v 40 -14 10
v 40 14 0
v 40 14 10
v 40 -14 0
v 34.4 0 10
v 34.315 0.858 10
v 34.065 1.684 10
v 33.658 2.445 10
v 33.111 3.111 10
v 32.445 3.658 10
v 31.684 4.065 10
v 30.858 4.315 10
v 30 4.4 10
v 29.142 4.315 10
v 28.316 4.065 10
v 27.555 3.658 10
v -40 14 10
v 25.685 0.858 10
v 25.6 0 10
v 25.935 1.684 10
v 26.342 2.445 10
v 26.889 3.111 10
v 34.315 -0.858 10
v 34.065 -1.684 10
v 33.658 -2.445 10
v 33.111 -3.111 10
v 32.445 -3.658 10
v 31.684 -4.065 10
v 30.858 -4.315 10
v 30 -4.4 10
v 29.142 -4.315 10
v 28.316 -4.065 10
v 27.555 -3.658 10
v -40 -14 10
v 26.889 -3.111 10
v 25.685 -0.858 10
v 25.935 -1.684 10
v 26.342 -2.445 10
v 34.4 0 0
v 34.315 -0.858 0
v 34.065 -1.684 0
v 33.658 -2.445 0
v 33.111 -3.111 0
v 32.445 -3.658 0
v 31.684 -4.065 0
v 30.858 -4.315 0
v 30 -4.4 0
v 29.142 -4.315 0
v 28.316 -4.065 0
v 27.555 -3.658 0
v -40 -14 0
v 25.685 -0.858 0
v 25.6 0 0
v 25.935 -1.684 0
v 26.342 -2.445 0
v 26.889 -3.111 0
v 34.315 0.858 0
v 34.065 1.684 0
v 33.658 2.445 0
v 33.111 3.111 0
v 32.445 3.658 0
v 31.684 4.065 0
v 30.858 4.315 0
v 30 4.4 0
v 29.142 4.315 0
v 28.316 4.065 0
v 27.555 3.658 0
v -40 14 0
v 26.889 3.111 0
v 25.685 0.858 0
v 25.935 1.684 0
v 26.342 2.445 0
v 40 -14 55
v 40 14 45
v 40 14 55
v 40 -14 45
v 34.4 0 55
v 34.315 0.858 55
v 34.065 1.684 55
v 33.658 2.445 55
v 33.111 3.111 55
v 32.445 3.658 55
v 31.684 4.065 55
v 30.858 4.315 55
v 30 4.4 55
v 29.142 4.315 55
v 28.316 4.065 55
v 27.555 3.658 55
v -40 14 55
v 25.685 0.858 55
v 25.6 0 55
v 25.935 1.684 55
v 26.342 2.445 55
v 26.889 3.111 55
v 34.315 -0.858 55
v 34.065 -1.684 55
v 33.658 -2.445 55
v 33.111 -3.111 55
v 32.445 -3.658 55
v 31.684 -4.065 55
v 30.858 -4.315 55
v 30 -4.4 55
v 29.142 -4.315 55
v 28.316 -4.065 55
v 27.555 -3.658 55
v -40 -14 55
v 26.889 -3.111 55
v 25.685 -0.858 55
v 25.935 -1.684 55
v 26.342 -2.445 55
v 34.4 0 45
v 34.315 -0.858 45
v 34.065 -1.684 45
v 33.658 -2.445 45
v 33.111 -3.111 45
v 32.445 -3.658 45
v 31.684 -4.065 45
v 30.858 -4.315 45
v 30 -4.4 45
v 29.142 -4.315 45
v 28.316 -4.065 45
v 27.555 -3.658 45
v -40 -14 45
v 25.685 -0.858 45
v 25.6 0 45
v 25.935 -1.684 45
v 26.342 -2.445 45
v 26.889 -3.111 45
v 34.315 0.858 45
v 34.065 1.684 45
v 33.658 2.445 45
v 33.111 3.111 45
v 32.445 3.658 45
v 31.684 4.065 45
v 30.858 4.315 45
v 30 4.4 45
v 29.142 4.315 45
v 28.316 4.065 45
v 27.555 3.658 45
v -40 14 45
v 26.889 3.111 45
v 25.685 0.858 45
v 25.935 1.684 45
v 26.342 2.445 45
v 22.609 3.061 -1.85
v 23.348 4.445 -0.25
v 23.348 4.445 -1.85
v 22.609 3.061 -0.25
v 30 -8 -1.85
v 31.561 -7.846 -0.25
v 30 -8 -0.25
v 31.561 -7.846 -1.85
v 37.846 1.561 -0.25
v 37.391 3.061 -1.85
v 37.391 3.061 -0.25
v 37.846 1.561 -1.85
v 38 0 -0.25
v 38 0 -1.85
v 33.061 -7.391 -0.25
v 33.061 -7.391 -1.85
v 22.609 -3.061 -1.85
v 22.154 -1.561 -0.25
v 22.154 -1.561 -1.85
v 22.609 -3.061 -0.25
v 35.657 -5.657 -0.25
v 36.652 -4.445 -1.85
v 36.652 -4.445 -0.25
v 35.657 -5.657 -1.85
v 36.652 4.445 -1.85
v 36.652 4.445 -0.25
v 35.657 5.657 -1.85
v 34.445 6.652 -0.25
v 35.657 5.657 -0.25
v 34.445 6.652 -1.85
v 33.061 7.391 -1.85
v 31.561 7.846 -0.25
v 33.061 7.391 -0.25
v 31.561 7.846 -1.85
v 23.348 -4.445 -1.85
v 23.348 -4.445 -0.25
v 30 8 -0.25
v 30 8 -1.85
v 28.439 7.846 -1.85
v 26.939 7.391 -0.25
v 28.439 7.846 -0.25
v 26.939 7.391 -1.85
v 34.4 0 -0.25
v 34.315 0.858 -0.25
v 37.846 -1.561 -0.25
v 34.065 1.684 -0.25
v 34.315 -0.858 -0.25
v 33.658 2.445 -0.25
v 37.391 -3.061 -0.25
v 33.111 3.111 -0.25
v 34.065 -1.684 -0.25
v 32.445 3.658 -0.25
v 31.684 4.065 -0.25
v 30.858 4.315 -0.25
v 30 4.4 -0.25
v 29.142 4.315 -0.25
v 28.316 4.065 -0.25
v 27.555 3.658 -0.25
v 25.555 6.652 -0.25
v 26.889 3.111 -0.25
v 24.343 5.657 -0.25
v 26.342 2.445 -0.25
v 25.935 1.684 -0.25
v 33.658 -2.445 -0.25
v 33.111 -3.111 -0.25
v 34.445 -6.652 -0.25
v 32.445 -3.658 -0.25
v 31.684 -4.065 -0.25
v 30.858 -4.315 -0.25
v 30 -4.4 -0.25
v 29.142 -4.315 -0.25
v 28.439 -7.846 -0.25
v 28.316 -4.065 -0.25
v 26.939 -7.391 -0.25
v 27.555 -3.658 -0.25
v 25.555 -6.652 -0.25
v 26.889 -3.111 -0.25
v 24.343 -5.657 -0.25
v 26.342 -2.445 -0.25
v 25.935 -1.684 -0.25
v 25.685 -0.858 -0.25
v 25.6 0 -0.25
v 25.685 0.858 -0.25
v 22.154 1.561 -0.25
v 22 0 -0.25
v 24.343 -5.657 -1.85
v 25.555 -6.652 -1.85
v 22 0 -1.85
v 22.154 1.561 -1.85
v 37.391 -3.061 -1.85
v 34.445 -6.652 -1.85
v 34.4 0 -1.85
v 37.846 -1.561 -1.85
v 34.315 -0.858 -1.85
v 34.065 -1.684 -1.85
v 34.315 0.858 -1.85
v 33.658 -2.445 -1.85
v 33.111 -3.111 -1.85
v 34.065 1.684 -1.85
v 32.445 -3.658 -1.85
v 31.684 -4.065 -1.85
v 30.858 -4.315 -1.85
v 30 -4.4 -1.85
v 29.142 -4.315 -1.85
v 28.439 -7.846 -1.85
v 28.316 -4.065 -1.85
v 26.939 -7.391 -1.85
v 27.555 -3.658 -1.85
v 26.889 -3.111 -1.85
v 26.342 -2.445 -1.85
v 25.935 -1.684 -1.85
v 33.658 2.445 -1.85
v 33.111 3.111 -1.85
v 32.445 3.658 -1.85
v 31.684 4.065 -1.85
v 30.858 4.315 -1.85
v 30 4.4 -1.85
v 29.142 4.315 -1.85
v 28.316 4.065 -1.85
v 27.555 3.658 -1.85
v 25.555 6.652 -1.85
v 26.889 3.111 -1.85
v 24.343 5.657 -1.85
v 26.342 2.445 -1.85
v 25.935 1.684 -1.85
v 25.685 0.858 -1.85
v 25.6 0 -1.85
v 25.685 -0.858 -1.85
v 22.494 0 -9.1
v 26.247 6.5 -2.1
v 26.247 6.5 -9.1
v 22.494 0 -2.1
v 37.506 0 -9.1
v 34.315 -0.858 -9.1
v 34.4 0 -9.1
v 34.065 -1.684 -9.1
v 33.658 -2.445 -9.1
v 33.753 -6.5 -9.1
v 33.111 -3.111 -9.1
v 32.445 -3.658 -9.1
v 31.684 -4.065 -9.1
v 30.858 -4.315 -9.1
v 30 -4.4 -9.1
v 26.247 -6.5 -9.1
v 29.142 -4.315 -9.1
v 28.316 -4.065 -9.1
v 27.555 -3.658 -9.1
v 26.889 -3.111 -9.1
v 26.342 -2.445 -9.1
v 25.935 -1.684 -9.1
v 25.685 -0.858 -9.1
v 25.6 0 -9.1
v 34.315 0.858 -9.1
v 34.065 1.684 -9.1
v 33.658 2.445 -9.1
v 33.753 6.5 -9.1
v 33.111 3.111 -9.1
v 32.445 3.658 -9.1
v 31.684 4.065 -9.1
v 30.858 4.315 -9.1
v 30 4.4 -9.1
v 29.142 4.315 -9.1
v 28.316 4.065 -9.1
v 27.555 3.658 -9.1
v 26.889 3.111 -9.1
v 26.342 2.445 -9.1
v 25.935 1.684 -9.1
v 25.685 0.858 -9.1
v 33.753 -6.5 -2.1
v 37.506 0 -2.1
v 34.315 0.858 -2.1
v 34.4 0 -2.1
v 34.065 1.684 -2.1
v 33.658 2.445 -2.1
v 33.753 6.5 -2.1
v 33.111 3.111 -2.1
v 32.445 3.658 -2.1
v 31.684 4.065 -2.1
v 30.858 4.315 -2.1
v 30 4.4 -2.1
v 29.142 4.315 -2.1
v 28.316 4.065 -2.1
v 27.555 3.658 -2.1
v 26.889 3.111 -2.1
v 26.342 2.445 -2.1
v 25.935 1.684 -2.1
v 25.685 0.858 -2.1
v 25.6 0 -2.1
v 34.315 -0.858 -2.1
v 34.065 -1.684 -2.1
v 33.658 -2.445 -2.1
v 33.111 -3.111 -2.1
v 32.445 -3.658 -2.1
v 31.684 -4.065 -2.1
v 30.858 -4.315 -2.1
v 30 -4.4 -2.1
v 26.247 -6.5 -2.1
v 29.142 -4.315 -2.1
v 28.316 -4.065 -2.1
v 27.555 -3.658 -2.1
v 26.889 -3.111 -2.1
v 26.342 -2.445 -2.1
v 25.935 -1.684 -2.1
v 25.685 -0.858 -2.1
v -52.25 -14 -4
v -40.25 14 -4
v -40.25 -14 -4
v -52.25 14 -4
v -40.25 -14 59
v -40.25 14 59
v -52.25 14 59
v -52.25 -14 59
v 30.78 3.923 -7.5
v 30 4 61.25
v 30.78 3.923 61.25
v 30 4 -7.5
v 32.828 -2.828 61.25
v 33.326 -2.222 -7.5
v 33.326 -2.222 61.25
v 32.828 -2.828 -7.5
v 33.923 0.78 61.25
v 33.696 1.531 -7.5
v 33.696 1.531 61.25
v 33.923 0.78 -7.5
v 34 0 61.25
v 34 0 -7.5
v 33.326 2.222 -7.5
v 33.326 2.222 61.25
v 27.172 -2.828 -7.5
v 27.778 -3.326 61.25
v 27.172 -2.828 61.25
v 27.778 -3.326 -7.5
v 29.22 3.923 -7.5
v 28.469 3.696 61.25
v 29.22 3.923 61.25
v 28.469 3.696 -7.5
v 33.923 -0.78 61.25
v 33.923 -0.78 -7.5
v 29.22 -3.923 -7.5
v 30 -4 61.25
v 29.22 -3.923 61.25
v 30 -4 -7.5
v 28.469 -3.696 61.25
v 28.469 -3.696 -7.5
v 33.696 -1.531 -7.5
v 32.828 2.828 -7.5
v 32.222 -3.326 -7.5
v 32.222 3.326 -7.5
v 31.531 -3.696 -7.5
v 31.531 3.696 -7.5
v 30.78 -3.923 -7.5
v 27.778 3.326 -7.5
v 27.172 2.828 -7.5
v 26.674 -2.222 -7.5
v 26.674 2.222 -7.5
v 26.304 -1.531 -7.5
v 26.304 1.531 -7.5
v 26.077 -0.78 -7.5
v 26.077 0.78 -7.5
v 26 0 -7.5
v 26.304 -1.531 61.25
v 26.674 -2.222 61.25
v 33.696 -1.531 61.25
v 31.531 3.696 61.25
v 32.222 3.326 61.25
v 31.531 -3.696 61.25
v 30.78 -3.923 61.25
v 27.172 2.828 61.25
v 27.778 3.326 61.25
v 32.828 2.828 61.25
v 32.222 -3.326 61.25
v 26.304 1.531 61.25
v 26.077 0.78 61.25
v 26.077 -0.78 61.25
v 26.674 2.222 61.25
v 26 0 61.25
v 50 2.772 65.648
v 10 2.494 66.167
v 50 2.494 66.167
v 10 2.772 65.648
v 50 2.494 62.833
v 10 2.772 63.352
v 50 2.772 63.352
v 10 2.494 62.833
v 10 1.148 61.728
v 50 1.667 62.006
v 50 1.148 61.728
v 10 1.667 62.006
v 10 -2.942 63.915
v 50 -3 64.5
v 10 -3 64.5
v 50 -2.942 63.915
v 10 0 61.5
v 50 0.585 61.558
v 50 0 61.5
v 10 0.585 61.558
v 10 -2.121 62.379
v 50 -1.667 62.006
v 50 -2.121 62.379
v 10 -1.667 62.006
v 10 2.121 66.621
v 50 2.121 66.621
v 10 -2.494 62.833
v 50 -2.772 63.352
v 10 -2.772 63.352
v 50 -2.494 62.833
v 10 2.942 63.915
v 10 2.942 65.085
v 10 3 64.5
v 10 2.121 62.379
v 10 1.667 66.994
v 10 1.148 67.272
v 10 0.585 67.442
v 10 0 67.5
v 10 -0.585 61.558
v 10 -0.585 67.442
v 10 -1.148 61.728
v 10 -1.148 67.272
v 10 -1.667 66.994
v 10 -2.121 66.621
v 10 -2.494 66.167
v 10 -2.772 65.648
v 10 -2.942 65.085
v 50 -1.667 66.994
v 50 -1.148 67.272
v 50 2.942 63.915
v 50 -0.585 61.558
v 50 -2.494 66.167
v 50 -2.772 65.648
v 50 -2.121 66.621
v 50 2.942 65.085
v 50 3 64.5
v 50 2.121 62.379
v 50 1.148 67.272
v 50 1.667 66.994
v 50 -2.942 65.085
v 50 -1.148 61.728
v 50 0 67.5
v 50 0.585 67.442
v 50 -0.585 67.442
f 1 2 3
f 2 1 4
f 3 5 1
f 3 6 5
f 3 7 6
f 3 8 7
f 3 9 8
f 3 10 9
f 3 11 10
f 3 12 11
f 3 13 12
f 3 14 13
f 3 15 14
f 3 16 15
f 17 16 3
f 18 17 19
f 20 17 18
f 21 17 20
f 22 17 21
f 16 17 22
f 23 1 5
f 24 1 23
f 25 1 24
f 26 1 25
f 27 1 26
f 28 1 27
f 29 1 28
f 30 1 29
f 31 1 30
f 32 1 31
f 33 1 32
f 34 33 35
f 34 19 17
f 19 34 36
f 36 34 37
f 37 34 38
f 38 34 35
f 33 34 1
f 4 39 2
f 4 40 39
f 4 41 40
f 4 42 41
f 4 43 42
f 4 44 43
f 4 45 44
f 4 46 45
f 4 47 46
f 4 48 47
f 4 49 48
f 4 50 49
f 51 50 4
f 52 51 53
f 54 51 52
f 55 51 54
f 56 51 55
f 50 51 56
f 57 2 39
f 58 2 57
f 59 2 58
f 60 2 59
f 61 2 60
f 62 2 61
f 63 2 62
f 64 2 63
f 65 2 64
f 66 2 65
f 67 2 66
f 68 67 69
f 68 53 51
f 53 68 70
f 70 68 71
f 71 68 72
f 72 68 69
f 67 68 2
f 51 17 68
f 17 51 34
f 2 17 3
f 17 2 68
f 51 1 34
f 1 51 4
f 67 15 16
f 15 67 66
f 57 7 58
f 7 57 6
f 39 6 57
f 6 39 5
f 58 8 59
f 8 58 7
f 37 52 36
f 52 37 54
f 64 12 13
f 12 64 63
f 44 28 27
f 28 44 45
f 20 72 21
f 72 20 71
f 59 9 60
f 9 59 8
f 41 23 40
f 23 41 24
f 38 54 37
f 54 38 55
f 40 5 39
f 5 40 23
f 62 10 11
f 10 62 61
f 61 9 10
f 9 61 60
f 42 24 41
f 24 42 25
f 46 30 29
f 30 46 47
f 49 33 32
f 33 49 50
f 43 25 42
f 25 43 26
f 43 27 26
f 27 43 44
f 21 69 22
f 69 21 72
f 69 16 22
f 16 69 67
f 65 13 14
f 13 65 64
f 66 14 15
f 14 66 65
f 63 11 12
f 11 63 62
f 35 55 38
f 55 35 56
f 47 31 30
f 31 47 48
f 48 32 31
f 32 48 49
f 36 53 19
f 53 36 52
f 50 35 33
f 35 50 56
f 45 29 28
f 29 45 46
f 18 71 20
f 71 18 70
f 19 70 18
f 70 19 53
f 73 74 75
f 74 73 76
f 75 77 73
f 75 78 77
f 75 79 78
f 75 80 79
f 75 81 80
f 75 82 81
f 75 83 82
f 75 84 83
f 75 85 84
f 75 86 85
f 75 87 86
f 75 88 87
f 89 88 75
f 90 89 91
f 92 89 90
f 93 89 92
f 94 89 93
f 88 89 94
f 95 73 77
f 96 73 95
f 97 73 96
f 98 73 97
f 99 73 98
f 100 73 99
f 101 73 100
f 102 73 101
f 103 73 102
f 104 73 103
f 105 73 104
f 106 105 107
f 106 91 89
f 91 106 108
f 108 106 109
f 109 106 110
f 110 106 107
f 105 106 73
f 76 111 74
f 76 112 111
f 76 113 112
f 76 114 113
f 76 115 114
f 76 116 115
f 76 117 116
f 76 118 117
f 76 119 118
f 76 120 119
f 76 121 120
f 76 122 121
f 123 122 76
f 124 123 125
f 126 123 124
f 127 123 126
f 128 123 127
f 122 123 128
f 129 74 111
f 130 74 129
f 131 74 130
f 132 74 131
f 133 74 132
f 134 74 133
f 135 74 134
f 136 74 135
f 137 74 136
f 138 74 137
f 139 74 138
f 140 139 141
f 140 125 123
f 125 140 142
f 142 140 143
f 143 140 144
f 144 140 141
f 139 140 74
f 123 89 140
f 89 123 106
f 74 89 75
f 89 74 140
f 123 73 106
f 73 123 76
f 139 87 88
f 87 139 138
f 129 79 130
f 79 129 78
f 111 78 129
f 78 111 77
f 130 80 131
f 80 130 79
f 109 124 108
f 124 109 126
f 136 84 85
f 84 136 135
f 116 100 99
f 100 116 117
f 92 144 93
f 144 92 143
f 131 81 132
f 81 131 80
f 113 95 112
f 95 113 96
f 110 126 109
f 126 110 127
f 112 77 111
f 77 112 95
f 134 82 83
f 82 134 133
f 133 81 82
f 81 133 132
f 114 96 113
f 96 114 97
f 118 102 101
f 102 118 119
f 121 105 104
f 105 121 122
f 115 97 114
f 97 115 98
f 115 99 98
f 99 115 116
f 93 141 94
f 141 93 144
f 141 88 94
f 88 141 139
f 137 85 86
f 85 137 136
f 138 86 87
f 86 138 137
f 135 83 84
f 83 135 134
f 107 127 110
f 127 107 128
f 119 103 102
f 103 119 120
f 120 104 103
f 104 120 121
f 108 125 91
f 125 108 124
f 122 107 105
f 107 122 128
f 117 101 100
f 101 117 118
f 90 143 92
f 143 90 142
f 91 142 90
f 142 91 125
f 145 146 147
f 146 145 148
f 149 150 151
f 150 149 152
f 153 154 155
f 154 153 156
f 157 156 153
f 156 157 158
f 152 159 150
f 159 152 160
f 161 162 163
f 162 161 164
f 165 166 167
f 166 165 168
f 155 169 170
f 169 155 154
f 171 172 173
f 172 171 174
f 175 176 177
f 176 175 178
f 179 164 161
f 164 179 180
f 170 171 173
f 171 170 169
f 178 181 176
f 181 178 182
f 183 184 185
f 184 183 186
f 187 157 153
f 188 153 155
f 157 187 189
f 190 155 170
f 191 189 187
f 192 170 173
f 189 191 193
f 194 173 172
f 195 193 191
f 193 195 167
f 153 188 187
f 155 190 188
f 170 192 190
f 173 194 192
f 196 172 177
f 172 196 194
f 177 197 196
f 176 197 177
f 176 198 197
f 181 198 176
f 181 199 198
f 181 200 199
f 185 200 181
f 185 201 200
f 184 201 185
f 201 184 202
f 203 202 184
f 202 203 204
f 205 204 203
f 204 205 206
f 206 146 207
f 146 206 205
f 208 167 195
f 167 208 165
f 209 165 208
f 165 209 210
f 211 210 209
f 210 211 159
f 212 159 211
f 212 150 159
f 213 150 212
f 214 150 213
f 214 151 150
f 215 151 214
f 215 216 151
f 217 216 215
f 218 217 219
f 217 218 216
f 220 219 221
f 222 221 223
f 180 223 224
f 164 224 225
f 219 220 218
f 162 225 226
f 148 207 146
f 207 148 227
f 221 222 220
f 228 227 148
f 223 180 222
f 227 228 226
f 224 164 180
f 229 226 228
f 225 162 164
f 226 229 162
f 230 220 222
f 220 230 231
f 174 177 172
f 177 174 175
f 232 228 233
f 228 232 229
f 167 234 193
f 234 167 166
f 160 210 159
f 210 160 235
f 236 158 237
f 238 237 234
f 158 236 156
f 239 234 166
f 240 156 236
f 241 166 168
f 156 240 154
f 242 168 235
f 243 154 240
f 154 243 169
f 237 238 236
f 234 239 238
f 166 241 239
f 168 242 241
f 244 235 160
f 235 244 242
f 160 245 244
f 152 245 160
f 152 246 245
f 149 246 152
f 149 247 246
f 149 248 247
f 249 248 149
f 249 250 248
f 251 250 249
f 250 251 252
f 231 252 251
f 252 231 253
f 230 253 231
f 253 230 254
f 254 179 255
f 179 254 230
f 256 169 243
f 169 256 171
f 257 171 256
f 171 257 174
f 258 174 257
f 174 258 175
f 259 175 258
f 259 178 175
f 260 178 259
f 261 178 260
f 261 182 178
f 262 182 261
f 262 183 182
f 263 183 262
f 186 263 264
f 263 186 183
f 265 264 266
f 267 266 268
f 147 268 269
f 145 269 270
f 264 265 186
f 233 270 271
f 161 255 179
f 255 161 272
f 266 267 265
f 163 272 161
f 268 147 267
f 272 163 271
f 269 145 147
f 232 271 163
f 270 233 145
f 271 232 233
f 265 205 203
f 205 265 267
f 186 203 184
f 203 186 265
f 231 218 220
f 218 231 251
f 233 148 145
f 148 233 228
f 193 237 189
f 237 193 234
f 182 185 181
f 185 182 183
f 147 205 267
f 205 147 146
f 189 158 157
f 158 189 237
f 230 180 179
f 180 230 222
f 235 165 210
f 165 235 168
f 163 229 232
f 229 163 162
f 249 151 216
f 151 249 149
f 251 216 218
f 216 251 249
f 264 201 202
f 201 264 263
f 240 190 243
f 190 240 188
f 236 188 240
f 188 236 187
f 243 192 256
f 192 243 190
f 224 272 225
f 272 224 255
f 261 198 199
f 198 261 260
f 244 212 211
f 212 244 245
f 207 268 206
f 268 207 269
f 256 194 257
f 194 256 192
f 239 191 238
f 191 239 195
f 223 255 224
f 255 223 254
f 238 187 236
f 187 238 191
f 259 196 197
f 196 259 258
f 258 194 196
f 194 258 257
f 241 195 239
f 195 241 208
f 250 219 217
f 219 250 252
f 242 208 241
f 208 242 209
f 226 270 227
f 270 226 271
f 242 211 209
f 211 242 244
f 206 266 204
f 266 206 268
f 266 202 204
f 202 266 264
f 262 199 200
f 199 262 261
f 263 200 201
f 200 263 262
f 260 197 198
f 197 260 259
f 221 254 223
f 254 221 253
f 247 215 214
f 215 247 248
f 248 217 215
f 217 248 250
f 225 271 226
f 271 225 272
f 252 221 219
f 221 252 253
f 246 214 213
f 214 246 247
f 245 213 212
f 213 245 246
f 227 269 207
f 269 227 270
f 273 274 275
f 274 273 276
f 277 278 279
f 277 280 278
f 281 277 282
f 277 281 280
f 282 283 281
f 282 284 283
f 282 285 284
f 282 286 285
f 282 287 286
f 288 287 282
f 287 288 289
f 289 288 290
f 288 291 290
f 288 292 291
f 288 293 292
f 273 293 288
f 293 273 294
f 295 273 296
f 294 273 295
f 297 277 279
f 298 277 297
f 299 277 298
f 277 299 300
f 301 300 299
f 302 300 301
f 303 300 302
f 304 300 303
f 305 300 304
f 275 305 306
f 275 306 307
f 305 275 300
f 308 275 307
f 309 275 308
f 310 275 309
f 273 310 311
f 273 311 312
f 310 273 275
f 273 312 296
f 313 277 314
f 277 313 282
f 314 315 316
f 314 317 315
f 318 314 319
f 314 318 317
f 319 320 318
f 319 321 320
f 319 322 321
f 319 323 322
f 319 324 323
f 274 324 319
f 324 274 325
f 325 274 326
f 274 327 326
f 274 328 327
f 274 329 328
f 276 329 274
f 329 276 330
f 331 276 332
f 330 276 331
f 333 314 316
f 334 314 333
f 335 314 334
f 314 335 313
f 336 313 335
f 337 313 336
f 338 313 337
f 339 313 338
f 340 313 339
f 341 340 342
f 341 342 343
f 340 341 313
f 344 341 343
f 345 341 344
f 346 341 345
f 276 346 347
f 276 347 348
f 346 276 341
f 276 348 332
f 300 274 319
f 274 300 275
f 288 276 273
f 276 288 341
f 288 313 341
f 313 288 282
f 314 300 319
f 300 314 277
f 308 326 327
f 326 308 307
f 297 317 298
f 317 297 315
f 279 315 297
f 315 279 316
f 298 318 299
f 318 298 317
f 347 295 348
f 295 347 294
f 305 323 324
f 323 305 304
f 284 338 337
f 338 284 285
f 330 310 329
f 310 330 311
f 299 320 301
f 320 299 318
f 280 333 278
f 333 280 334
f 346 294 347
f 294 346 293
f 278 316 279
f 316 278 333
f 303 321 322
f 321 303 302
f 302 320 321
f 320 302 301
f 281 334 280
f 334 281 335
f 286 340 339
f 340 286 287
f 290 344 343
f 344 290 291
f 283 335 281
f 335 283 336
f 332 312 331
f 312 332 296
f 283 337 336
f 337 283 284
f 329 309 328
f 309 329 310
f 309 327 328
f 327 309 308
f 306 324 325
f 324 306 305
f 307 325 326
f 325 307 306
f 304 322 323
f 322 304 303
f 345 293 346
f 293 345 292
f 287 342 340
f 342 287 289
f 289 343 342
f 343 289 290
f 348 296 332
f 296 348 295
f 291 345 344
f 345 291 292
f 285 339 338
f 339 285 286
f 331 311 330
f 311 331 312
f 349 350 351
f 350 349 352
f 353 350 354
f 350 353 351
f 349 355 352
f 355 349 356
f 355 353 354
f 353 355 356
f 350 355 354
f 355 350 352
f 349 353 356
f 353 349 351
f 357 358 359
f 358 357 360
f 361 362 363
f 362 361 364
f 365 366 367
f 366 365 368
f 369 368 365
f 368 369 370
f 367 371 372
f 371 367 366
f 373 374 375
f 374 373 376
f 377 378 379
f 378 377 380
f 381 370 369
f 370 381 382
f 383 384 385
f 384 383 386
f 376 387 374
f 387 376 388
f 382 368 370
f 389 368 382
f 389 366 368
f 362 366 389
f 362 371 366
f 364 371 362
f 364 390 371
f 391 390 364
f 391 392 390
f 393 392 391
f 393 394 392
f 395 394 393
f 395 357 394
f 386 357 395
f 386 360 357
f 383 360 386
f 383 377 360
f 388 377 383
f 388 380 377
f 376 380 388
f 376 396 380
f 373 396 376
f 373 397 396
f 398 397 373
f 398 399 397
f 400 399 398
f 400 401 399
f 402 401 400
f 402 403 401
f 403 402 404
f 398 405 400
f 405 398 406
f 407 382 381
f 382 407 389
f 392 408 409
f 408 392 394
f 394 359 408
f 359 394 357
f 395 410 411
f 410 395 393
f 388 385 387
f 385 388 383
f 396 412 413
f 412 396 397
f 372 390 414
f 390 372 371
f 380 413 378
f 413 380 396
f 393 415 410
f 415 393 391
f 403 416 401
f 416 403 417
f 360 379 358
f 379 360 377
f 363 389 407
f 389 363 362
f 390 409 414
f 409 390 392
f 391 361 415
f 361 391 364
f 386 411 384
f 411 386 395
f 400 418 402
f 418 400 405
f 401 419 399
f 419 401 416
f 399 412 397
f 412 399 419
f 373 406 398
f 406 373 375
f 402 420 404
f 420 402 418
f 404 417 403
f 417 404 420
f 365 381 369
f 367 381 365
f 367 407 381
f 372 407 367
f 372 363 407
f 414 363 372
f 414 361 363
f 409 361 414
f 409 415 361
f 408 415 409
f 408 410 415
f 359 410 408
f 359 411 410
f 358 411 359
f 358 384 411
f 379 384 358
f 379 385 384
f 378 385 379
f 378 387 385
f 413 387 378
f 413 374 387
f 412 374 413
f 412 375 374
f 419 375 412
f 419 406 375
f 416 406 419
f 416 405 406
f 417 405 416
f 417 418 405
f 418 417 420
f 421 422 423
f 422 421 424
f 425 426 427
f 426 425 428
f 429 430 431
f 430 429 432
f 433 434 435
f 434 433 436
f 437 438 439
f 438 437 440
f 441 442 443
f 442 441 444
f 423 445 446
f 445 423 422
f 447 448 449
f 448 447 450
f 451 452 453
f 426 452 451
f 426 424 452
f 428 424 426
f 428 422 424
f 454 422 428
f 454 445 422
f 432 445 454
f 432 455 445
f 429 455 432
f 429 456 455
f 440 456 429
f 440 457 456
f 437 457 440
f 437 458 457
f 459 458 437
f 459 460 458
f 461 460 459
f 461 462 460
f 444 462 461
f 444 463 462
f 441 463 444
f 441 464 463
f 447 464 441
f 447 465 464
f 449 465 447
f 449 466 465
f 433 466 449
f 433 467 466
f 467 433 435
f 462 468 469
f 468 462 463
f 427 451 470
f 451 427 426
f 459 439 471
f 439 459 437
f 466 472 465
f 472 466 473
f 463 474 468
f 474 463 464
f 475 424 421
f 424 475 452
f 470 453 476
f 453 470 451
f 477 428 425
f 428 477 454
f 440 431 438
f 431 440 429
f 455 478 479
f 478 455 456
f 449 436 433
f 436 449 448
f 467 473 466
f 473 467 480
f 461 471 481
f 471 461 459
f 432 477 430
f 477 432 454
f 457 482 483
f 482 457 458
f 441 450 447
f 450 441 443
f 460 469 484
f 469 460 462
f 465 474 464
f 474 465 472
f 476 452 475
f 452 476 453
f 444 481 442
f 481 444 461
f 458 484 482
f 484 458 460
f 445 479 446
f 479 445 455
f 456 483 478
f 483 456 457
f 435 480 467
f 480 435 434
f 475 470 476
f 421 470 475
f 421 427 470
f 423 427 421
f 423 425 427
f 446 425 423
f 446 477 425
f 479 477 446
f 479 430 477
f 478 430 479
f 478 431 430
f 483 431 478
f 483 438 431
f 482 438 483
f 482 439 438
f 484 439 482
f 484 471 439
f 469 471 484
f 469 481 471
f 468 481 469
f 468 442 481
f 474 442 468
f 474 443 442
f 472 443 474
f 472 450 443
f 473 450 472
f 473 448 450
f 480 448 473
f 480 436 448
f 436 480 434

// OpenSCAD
$fn = 32;

// ------------------------------------------------------------------------
// C clamp: throat 45 mm, screw d8
// Every part is its own module, assembly() places every instance.
// ------------------------------------------------------------------------

// --- part 1 ---
module clamp_arm() {
  difference() {
    translate([-40, -14, 0]) cube([80, 28, 10]);
    translate([30, 0, -1]) cylinder(h = 12, d = 8.8);
  }
}

// --- part 2 ---
module clamp_spine() {
  difference() {
    translate([-31.5, -14, 0]) cube([63, 28, 12]);
  }
}

// --- part 3 ---
module clamp_screw() {
  translate([0, 0, -34.375]) cylinder(h = 68.75, d = 8);
}

// --- part 4 ---
module clamp_washer() {
  difference() {
      translate([0, 0, 0]) cylinder(h = 1.6, d = 16);
      translate([0, 0, -1]) cylinder(h = 3.6, d = 8.8);
    }
}

// --- part 5 ---
module clamp_nut() {
  difference() {
    linear_extrude(height = 7) polygon(points = [[7.506, 0], [3.753, 6.5], [-3.753, 6.5], [-7.506, 0], [-3.753, -6.5], [3.753, -6.5]]);
    translate([0, 0, -1]) cylinder(h = 9, d = 8.8);
  }
}

// --- part 6 ---
module tommy_bar() {
  translate([0, 0, -20]) cylinder(h = 40, d = 6);
}

// --- assembly ---
module assembly() {
  color([0.80, 0.24, 0.20]) translate([0, 0, 0]) rotate([0, 0, 0]) clamp_arm();
  color([0.20, 0.45, 0.75]) translate([0, 0, 45]) rotate([0, 0, 0]) clamp_arm();
  color([0.25, 0.62, 0.32]) translate([-52.25, 0, 27.5]) rotate([0, 90, 0]) clamp_spine();
  color([0.92, 0.70, 0.18]) translate([30, 0, 26.875]) rotate([0, 0, 0]) clamp_screw();
  color([0.58, 0.35, 0.70]) translate([30, 0, -1.85]) rotate([0, 0, 0]) clamp_washer();
  color([0.16, 0.66, 0.66]) translate([30, 0, -9.1]) rotate([0, 0, 0]) clamp_nut();
  color([0.85, 0.48, 0.18]) translate([30, 0, 64.5]) rotate([0, 90, 0]) tommy_bar();
}

assembly();
